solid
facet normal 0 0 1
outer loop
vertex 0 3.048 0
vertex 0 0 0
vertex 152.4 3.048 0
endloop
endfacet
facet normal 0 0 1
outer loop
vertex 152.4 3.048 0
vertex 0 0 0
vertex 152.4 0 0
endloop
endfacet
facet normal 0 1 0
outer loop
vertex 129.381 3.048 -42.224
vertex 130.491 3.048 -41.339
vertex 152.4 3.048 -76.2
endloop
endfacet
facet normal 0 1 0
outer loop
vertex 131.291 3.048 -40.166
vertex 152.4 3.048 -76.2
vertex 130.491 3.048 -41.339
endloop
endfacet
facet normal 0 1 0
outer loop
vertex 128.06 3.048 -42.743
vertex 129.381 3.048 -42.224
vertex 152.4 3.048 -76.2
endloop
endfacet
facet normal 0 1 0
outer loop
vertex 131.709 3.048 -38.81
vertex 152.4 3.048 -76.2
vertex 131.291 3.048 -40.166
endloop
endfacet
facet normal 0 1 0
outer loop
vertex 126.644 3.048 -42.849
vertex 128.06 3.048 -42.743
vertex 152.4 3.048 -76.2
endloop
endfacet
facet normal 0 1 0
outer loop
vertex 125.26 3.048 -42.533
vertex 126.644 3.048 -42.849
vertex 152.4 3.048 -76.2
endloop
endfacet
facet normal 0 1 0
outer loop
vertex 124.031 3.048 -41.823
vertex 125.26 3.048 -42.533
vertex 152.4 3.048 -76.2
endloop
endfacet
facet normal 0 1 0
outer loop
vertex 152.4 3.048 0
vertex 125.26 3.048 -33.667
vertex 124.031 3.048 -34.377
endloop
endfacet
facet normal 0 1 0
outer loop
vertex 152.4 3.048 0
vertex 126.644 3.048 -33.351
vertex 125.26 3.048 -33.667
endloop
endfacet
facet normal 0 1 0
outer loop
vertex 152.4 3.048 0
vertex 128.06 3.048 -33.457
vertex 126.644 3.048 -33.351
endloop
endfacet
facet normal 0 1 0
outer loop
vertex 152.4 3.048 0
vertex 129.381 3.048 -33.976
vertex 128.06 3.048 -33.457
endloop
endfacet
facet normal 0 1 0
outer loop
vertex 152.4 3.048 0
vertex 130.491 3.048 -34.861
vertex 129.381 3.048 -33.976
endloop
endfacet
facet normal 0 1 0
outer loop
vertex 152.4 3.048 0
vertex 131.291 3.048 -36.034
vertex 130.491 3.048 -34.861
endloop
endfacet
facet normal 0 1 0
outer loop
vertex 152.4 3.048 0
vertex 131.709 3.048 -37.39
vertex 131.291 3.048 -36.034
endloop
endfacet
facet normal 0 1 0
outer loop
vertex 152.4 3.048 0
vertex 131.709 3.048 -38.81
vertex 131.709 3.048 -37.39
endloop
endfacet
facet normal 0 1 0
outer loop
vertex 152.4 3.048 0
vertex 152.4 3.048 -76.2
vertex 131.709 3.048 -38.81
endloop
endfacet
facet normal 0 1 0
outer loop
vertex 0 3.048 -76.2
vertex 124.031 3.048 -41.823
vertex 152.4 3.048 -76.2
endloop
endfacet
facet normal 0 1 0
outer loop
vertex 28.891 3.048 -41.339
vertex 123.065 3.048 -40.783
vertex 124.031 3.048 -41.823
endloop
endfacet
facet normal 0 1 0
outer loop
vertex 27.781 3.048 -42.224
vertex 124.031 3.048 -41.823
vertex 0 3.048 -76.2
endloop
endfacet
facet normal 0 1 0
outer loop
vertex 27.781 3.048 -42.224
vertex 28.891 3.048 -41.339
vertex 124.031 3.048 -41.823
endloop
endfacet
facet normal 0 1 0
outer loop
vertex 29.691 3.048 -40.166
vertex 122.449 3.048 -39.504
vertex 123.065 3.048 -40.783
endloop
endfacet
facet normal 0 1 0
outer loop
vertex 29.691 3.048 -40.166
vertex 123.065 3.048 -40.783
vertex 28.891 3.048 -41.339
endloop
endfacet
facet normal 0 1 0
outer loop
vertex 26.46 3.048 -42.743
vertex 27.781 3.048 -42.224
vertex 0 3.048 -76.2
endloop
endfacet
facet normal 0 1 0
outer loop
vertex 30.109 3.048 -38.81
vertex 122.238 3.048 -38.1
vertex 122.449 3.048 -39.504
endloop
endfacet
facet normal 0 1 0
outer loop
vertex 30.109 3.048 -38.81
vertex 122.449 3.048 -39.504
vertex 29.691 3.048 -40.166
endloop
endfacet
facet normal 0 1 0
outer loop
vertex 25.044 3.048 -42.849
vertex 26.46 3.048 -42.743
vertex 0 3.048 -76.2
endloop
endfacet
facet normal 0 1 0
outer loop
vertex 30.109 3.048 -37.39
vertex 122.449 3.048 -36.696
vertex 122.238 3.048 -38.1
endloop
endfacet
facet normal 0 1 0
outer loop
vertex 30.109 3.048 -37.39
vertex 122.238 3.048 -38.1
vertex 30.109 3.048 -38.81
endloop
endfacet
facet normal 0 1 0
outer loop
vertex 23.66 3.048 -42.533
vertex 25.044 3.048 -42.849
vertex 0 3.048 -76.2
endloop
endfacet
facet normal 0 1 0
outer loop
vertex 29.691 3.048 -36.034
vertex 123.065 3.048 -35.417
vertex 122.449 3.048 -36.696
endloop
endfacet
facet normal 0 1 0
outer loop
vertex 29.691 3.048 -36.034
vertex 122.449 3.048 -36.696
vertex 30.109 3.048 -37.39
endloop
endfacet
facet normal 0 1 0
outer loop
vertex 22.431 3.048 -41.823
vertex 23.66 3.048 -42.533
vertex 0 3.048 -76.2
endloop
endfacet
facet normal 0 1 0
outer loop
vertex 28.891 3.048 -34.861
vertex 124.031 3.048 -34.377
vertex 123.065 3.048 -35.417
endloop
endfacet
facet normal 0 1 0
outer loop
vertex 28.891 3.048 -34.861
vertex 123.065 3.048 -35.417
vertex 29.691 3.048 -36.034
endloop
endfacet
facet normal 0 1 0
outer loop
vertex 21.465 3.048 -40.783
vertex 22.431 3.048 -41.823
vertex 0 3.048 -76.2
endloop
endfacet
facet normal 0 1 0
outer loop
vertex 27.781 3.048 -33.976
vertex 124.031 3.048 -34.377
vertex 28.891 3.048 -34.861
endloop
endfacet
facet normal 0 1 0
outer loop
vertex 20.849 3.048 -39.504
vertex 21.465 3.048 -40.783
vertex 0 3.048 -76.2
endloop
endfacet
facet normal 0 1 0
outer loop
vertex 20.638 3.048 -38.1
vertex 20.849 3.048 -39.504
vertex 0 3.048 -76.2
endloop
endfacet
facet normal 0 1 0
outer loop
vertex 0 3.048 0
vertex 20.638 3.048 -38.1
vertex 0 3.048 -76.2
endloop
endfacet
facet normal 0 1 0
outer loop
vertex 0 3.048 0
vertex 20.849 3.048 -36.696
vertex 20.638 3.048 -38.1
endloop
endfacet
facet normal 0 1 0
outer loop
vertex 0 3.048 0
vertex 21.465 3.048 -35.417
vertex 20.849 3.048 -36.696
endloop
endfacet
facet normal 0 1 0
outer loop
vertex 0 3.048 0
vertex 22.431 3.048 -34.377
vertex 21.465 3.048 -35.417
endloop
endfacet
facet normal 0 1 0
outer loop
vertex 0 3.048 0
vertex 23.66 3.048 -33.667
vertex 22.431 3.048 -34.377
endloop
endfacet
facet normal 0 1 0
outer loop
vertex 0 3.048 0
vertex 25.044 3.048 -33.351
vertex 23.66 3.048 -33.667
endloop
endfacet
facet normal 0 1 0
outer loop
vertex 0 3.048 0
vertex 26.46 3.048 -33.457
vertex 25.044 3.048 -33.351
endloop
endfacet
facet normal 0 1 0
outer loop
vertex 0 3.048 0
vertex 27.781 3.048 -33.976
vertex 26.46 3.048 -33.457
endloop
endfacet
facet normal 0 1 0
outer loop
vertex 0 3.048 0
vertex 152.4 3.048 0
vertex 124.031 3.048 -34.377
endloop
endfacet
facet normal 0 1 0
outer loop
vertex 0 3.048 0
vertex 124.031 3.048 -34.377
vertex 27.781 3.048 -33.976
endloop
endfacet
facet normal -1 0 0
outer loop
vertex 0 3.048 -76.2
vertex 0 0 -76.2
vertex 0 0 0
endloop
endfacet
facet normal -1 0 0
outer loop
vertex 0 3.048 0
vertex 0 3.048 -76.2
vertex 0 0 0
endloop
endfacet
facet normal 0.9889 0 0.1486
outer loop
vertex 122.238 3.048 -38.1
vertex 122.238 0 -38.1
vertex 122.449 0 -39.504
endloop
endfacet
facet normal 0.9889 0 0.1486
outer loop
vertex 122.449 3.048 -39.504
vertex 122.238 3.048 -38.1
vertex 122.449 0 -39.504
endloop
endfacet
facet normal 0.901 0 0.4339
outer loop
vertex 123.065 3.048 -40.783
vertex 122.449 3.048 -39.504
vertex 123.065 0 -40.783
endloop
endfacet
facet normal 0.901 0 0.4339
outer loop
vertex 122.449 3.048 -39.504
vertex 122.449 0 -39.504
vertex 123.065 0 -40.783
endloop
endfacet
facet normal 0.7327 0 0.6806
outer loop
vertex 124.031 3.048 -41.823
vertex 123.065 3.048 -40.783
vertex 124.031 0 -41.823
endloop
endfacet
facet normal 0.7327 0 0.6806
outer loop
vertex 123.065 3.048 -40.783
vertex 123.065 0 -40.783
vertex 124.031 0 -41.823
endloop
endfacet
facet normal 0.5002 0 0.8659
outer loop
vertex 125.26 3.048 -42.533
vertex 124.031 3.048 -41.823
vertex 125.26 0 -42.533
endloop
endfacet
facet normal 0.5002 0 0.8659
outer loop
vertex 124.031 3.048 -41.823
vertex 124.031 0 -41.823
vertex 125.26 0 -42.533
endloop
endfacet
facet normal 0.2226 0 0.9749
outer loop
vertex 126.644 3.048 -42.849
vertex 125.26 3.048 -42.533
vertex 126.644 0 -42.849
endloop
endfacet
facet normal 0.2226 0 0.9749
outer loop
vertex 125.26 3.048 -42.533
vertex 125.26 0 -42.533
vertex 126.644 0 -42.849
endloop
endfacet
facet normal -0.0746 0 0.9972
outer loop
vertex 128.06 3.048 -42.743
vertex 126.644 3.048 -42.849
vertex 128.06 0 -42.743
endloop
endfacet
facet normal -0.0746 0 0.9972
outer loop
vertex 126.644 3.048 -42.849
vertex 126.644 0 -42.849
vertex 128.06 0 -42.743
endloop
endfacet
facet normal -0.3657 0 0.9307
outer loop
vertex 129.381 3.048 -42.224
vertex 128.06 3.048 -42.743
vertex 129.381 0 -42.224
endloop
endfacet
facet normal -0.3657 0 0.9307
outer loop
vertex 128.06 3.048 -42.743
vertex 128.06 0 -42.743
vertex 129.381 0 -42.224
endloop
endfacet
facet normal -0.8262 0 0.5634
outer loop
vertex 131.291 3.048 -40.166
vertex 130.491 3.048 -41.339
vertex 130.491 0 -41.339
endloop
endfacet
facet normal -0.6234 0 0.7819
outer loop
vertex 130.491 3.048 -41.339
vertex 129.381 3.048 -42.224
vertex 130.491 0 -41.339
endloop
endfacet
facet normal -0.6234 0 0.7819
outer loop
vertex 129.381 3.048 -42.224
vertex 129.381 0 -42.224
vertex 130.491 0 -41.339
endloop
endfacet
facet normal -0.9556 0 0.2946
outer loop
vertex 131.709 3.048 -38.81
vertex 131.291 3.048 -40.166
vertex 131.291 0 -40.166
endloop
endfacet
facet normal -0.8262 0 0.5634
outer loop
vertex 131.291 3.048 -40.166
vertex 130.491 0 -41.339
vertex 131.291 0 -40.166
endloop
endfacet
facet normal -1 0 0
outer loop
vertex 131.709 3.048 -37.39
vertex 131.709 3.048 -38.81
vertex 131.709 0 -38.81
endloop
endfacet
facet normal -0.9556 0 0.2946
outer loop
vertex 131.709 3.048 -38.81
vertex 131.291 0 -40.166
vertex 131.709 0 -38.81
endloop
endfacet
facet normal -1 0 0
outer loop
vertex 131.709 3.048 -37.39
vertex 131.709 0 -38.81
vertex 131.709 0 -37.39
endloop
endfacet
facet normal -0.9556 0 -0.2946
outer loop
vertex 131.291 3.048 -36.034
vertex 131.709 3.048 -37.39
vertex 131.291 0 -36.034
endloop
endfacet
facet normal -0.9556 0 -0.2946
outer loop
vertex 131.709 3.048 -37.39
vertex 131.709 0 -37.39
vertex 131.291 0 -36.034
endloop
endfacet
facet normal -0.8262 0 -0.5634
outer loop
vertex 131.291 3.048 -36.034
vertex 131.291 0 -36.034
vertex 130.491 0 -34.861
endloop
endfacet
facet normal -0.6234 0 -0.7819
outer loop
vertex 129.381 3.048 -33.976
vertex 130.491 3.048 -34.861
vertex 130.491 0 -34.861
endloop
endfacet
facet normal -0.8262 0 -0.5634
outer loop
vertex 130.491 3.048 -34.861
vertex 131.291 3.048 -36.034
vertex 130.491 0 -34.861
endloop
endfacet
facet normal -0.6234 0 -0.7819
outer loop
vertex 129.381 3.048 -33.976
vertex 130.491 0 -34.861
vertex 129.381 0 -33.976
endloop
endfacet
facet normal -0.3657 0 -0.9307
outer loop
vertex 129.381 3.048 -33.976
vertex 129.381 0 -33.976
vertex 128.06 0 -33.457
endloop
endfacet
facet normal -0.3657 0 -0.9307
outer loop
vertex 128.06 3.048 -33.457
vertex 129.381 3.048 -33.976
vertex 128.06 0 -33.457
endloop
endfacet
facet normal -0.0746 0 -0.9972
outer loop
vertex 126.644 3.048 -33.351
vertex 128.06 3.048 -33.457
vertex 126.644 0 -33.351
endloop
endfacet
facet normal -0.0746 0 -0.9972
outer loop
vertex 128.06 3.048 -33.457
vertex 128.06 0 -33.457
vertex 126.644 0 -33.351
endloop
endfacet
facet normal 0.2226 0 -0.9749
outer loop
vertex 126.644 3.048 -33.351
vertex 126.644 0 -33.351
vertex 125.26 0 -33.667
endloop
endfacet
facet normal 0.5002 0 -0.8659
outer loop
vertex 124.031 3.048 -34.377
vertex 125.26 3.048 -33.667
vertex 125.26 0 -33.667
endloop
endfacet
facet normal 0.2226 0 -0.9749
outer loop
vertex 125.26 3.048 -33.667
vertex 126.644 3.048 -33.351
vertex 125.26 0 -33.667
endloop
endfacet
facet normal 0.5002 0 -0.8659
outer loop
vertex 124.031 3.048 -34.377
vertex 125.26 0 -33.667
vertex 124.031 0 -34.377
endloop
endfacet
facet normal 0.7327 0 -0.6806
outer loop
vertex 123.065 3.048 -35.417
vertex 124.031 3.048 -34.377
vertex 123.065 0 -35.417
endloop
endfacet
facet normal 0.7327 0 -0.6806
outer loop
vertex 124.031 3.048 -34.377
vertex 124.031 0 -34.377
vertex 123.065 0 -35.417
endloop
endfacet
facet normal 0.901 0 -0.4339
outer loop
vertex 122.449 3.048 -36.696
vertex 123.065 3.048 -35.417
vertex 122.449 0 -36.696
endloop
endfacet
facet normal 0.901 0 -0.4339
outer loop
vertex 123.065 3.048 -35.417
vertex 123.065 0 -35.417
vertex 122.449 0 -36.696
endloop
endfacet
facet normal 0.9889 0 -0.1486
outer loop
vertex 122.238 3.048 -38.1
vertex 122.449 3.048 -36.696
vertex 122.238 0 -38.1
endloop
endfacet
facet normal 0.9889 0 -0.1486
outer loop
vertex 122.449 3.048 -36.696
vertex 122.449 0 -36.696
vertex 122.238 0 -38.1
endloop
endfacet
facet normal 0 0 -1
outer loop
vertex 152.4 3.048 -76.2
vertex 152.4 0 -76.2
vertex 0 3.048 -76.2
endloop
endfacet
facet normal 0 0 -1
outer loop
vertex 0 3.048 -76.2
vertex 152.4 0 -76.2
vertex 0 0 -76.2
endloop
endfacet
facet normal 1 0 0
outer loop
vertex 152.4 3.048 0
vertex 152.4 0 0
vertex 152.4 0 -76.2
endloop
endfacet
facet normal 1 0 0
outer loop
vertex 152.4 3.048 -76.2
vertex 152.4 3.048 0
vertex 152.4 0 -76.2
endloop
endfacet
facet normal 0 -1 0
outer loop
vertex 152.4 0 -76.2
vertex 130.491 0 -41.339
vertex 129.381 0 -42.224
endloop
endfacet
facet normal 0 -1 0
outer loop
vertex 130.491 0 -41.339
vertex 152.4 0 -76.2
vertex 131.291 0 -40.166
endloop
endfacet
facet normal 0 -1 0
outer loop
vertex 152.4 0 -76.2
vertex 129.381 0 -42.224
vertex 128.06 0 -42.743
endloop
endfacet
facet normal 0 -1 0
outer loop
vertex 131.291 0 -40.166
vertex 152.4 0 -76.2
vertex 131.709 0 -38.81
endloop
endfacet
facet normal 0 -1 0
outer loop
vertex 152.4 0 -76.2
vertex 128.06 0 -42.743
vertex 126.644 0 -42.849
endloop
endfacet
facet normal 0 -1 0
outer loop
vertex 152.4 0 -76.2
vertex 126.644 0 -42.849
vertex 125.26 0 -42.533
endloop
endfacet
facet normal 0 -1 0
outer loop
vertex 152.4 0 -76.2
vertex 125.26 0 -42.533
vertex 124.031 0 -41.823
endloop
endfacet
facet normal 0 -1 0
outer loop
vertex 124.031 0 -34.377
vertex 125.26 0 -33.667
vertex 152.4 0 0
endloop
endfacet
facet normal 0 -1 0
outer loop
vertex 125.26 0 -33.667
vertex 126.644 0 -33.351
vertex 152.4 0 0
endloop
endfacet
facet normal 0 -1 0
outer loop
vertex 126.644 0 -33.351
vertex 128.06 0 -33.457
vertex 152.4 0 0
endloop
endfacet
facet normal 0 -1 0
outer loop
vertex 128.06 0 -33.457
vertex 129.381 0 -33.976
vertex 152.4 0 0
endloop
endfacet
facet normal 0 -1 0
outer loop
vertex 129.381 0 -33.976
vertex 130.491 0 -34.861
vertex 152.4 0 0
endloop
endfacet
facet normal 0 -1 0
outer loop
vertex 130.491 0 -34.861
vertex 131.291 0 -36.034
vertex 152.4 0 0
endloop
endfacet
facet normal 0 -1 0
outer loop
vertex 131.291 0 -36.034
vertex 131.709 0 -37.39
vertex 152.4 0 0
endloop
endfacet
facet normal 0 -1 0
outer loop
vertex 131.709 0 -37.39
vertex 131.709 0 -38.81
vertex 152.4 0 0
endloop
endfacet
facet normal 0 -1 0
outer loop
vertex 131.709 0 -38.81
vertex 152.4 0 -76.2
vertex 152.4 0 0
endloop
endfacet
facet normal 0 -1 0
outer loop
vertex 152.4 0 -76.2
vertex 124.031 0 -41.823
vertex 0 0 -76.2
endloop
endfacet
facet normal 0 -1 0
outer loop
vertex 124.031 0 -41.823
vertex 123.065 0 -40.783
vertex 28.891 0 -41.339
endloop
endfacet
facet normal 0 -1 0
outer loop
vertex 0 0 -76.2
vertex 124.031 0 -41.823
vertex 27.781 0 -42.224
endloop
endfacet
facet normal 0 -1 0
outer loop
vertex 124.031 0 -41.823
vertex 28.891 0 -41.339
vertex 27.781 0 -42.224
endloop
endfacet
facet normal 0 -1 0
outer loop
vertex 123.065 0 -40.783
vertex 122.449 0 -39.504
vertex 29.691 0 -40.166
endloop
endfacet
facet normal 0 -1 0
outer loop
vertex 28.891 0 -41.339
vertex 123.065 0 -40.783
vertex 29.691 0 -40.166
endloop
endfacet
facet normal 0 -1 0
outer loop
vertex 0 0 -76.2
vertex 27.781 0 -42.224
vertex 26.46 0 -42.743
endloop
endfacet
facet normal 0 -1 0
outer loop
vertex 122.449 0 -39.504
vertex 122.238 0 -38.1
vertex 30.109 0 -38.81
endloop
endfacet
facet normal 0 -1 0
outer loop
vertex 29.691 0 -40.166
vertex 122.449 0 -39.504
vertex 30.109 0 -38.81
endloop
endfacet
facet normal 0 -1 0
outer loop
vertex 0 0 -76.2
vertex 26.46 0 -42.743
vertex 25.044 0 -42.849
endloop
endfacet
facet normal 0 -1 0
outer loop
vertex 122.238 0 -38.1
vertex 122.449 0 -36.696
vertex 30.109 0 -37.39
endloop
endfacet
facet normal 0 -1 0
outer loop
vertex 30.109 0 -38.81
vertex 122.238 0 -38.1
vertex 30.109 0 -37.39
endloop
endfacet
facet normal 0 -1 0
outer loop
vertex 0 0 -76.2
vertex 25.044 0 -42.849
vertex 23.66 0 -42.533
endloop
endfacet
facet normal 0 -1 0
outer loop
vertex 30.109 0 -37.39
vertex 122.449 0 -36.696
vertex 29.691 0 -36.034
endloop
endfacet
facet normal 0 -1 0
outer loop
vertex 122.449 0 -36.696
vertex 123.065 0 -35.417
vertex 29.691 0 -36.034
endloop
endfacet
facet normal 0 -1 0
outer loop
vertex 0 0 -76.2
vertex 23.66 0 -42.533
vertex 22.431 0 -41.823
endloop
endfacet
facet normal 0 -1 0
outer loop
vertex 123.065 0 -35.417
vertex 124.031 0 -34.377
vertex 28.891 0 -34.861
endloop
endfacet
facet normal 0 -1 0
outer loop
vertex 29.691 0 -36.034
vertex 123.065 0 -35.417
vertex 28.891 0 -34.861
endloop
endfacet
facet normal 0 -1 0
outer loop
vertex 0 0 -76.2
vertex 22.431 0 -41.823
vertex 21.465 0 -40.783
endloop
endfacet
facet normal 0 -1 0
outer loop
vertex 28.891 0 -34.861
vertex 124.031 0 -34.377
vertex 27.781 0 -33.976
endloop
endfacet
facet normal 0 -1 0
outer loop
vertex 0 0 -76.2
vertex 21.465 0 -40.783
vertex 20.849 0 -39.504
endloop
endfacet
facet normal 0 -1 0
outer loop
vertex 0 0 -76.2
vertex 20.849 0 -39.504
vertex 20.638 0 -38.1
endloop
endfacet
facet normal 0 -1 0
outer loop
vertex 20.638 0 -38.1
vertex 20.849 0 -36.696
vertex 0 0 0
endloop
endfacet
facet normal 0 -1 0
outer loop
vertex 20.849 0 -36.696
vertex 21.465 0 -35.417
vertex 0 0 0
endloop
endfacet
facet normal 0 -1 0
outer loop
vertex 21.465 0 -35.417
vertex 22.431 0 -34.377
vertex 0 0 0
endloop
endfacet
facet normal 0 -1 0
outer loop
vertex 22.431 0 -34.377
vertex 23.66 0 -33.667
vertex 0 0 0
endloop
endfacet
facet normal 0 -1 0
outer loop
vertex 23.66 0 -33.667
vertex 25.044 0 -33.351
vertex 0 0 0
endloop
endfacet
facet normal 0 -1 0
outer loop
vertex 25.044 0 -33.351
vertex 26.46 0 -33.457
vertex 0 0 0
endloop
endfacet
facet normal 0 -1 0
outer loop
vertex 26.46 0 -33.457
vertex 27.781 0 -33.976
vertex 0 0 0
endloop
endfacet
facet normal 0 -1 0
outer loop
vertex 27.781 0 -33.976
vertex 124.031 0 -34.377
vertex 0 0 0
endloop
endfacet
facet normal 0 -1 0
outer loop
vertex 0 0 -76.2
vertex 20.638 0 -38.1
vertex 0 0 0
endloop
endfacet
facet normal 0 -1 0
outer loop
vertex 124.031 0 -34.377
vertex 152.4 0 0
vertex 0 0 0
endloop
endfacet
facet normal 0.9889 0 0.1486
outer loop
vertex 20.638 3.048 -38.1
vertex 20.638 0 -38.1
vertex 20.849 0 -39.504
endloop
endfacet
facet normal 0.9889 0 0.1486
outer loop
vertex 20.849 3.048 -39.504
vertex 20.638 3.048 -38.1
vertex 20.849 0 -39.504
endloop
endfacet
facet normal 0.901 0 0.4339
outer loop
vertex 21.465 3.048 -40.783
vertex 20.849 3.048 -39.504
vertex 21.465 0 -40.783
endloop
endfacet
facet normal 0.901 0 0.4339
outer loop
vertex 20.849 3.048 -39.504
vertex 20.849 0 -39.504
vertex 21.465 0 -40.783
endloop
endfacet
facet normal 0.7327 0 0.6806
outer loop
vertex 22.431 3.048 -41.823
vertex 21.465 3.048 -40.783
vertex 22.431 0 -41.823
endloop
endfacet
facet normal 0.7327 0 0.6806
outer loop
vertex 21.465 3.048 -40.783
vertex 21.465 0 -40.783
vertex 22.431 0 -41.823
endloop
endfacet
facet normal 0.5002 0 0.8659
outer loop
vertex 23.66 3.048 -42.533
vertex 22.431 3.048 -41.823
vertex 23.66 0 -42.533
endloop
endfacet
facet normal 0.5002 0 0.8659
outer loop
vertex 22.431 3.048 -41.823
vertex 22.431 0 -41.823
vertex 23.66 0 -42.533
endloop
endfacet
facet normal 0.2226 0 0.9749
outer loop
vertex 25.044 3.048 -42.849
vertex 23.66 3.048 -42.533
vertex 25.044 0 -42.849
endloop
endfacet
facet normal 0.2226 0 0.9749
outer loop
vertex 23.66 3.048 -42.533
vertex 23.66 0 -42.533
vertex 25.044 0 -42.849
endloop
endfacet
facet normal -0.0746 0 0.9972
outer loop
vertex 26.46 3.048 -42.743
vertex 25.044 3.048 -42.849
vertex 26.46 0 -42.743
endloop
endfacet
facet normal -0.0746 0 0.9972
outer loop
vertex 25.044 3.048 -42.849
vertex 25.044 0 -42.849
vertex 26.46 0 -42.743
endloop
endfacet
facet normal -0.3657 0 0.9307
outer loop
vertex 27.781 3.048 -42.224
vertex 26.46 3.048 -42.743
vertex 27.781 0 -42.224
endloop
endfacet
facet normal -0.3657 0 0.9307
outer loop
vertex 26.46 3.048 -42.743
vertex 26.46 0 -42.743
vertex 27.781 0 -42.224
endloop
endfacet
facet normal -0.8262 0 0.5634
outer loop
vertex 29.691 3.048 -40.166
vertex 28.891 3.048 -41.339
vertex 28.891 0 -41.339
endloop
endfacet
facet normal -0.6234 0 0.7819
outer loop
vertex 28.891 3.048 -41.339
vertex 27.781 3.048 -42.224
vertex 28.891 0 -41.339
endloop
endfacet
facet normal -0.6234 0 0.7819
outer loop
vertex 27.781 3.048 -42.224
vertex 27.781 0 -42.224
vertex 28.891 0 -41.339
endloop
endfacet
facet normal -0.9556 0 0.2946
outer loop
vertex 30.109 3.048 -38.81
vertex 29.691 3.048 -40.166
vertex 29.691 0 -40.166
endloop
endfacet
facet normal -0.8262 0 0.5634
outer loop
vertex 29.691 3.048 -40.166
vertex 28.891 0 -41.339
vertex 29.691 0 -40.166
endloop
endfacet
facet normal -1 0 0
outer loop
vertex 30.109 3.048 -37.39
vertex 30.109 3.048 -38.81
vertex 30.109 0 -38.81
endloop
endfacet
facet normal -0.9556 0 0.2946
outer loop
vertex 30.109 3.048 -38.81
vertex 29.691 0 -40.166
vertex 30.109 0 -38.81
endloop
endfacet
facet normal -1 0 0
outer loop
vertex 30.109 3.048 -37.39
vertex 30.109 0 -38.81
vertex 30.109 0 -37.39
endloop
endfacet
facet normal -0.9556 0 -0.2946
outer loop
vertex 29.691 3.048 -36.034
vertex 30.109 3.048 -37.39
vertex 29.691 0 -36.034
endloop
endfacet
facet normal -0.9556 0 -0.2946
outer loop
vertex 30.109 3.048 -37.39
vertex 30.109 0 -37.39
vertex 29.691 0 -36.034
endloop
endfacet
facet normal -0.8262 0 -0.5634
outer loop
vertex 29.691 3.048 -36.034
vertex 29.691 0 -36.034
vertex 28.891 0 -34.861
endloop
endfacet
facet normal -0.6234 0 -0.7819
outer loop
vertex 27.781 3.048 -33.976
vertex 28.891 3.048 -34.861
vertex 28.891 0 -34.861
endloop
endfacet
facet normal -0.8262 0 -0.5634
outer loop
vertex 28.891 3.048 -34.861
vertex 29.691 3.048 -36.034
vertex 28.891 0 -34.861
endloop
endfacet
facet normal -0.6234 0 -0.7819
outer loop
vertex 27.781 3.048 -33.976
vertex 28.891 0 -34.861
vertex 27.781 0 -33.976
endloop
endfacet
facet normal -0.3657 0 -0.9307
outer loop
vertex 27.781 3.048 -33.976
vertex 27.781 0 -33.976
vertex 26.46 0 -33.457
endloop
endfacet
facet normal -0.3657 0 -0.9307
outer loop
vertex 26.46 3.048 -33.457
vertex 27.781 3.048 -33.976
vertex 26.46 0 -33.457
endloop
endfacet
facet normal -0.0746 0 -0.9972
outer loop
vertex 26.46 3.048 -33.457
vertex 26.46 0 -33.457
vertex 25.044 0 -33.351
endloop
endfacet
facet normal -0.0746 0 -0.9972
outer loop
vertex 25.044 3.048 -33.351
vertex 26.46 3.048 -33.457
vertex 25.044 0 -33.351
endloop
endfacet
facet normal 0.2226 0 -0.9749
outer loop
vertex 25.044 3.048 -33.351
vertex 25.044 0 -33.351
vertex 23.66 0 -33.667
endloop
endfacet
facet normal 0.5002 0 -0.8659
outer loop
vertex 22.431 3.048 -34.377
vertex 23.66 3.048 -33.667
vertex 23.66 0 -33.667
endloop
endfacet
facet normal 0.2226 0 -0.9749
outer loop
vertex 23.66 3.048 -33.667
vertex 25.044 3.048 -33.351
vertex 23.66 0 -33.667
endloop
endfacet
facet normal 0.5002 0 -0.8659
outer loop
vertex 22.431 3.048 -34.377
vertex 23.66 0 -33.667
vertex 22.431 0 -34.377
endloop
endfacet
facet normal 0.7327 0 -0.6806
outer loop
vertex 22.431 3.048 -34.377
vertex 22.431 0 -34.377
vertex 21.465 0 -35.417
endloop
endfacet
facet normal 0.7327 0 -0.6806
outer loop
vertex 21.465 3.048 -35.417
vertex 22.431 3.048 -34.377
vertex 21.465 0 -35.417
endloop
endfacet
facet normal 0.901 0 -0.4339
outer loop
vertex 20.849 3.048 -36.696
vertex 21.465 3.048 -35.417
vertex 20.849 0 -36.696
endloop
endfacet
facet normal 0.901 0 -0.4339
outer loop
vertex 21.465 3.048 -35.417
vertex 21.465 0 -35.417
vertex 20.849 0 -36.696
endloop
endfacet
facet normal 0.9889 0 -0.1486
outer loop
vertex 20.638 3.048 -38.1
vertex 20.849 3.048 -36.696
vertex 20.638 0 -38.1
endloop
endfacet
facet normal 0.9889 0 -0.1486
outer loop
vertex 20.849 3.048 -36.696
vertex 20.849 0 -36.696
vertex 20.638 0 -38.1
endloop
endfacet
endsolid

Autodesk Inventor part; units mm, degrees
ref_plane "YZ Plane" through (0, 0, 0) normal (1, 0, 0) x (0, 1, 0)
ref_plane "XZ Plane" through (0, 0, 0) normal (0, 1, 0) x (-1, 0, 0)
ref_plane "XY Plane" through (0, 0, 0) normal (0, 0, 1) x (1, 0, 0)
sketch "Sketch1" plane through (0, 0, 0) normal (0, 1, 0) x (-1, 0, 0)
  line L0 (0, 0) -> (-152.4, 0)
  line L1 (-152.4, 0) -> (-152.4, -76.2)
  line L2 (-152.4, -76.2) -> (0, -76.2)
  line L3 (0, -76.2) -> (0, 0)
  circle A0 centre (-25.4, -38.1) radius 4.7625
  circle A1 centre (-127, -38.1) radius 4.7625
  dimension "d0" = 152.4
  dimension "d1" = 76.2
  dimension "d3" = 9.525
  dimension "d7" = 9.525
extrude "Plate1" add sketch "Sketch1" along normal blind 3.048
equation "\"d8\" = Thickness"
equation "\"BendRadius\" = Thickness"
equation "\"BendReliefWidth\" = Thickness"
equation "\"BendReliefDepth\" = 0.5 * Thickness"
equation "\"CornerReliefSize\" = 4 * Thickness"
equation "\"MinimumRemnant\" = 2 * Thickness"
equation "\"TransitionRadius\" = BendRadius"
equation "\"JacobiRadiusSize\" = BendRadius"
equation "\"GapSize\" = Thickness"
equation "\"Thickness\" = 3.048"
properties part number "6x3"
